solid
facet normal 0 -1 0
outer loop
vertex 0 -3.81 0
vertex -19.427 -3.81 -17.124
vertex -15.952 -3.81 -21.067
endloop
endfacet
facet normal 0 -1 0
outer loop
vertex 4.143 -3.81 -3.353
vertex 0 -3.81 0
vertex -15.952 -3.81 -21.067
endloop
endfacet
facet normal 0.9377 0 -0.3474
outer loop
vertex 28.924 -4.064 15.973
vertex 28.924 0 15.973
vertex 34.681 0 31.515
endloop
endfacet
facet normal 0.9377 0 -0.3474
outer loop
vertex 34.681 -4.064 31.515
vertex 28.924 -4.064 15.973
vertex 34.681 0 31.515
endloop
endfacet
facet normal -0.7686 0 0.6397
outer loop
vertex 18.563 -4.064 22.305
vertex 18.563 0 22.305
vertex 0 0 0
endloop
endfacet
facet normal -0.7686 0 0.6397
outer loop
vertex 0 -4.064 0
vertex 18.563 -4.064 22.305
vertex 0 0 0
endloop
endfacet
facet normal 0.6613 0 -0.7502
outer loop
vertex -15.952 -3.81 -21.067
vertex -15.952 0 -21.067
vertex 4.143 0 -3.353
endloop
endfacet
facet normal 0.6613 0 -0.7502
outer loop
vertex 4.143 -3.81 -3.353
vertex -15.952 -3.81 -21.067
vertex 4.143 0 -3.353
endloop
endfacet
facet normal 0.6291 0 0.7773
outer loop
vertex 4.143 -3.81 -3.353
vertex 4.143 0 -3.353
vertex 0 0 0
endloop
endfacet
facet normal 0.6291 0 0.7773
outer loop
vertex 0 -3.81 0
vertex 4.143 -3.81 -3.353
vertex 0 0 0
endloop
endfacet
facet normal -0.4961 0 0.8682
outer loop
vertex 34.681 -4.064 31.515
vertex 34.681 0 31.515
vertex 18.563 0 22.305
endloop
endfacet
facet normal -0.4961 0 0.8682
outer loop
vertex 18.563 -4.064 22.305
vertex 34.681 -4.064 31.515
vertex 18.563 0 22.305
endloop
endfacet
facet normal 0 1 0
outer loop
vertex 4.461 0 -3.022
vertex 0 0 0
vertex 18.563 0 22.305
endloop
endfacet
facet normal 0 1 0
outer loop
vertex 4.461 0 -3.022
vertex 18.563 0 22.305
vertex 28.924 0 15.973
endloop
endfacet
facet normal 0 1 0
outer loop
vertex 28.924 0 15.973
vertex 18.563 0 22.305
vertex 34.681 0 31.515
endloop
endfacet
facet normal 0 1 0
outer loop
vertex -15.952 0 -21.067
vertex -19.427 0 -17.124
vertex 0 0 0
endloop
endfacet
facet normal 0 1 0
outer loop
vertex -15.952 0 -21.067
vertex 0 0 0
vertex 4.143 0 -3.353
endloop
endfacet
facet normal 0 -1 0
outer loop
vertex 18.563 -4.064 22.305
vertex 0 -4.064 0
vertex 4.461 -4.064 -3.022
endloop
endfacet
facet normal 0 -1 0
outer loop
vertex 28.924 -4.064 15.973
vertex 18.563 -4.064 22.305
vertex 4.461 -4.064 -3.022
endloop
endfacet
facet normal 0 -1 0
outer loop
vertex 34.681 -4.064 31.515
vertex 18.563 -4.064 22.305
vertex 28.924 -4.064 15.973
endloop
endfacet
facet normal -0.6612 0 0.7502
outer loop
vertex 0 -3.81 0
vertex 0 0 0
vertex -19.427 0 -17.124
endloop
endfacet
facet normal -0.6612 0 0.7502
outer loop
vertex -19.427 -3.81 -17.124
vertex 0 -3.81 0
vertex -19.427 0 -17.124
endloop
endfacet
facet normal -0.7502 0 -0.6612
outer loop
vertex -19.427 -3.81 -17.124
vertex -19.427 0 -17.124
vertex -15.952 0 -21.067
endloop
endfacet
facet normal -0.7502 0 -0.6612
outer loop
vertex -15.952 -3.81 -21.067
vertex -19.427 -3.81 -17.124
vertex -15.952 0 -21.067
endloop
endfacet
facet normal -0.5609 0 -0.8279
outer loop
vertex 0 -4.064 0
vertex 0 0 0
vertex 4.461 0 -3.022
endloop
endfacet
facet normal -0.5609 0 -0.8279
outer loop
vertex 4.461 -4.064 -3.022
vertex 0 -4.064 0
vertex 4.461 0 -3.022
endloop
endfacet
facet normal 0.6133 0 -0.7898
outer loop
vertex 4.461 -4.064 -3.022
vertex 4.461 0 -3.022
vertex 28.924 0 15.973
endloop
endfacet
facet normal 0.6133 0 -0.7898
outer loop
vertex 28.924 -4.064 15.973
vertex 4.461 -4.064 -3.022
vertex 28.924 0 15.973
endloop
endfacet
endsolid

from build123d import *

# Parameters (mm, degrees)
F1_DEPTH = 3.81
F3_DEPTH = 4.064


with BuildPart() as f1:
    # F0 (on Front) → F1 (new body)
    with BuildSketch(Plane.XZ):
        Polygon((4.143255, -3.353205), (0, 0), (-19.42689, -17.124442), (-15.951874, -21.066688), align=None)
    extrude(amount=F1_DEPTH)


with BuildPart() as f3:
    # F2 (on Front) → F3 (new body)
    with BuildSketch(Plane.XZ):
        Polygon((18.56347, 22.304947), (0, 0), (4.460991, -3.02196), (28.92448, 15.97322), (34.680594, 31.51473), align=None)
    extrude(amount=F3_DEPTH)


solid = Compound([f1.part, f3.part])
